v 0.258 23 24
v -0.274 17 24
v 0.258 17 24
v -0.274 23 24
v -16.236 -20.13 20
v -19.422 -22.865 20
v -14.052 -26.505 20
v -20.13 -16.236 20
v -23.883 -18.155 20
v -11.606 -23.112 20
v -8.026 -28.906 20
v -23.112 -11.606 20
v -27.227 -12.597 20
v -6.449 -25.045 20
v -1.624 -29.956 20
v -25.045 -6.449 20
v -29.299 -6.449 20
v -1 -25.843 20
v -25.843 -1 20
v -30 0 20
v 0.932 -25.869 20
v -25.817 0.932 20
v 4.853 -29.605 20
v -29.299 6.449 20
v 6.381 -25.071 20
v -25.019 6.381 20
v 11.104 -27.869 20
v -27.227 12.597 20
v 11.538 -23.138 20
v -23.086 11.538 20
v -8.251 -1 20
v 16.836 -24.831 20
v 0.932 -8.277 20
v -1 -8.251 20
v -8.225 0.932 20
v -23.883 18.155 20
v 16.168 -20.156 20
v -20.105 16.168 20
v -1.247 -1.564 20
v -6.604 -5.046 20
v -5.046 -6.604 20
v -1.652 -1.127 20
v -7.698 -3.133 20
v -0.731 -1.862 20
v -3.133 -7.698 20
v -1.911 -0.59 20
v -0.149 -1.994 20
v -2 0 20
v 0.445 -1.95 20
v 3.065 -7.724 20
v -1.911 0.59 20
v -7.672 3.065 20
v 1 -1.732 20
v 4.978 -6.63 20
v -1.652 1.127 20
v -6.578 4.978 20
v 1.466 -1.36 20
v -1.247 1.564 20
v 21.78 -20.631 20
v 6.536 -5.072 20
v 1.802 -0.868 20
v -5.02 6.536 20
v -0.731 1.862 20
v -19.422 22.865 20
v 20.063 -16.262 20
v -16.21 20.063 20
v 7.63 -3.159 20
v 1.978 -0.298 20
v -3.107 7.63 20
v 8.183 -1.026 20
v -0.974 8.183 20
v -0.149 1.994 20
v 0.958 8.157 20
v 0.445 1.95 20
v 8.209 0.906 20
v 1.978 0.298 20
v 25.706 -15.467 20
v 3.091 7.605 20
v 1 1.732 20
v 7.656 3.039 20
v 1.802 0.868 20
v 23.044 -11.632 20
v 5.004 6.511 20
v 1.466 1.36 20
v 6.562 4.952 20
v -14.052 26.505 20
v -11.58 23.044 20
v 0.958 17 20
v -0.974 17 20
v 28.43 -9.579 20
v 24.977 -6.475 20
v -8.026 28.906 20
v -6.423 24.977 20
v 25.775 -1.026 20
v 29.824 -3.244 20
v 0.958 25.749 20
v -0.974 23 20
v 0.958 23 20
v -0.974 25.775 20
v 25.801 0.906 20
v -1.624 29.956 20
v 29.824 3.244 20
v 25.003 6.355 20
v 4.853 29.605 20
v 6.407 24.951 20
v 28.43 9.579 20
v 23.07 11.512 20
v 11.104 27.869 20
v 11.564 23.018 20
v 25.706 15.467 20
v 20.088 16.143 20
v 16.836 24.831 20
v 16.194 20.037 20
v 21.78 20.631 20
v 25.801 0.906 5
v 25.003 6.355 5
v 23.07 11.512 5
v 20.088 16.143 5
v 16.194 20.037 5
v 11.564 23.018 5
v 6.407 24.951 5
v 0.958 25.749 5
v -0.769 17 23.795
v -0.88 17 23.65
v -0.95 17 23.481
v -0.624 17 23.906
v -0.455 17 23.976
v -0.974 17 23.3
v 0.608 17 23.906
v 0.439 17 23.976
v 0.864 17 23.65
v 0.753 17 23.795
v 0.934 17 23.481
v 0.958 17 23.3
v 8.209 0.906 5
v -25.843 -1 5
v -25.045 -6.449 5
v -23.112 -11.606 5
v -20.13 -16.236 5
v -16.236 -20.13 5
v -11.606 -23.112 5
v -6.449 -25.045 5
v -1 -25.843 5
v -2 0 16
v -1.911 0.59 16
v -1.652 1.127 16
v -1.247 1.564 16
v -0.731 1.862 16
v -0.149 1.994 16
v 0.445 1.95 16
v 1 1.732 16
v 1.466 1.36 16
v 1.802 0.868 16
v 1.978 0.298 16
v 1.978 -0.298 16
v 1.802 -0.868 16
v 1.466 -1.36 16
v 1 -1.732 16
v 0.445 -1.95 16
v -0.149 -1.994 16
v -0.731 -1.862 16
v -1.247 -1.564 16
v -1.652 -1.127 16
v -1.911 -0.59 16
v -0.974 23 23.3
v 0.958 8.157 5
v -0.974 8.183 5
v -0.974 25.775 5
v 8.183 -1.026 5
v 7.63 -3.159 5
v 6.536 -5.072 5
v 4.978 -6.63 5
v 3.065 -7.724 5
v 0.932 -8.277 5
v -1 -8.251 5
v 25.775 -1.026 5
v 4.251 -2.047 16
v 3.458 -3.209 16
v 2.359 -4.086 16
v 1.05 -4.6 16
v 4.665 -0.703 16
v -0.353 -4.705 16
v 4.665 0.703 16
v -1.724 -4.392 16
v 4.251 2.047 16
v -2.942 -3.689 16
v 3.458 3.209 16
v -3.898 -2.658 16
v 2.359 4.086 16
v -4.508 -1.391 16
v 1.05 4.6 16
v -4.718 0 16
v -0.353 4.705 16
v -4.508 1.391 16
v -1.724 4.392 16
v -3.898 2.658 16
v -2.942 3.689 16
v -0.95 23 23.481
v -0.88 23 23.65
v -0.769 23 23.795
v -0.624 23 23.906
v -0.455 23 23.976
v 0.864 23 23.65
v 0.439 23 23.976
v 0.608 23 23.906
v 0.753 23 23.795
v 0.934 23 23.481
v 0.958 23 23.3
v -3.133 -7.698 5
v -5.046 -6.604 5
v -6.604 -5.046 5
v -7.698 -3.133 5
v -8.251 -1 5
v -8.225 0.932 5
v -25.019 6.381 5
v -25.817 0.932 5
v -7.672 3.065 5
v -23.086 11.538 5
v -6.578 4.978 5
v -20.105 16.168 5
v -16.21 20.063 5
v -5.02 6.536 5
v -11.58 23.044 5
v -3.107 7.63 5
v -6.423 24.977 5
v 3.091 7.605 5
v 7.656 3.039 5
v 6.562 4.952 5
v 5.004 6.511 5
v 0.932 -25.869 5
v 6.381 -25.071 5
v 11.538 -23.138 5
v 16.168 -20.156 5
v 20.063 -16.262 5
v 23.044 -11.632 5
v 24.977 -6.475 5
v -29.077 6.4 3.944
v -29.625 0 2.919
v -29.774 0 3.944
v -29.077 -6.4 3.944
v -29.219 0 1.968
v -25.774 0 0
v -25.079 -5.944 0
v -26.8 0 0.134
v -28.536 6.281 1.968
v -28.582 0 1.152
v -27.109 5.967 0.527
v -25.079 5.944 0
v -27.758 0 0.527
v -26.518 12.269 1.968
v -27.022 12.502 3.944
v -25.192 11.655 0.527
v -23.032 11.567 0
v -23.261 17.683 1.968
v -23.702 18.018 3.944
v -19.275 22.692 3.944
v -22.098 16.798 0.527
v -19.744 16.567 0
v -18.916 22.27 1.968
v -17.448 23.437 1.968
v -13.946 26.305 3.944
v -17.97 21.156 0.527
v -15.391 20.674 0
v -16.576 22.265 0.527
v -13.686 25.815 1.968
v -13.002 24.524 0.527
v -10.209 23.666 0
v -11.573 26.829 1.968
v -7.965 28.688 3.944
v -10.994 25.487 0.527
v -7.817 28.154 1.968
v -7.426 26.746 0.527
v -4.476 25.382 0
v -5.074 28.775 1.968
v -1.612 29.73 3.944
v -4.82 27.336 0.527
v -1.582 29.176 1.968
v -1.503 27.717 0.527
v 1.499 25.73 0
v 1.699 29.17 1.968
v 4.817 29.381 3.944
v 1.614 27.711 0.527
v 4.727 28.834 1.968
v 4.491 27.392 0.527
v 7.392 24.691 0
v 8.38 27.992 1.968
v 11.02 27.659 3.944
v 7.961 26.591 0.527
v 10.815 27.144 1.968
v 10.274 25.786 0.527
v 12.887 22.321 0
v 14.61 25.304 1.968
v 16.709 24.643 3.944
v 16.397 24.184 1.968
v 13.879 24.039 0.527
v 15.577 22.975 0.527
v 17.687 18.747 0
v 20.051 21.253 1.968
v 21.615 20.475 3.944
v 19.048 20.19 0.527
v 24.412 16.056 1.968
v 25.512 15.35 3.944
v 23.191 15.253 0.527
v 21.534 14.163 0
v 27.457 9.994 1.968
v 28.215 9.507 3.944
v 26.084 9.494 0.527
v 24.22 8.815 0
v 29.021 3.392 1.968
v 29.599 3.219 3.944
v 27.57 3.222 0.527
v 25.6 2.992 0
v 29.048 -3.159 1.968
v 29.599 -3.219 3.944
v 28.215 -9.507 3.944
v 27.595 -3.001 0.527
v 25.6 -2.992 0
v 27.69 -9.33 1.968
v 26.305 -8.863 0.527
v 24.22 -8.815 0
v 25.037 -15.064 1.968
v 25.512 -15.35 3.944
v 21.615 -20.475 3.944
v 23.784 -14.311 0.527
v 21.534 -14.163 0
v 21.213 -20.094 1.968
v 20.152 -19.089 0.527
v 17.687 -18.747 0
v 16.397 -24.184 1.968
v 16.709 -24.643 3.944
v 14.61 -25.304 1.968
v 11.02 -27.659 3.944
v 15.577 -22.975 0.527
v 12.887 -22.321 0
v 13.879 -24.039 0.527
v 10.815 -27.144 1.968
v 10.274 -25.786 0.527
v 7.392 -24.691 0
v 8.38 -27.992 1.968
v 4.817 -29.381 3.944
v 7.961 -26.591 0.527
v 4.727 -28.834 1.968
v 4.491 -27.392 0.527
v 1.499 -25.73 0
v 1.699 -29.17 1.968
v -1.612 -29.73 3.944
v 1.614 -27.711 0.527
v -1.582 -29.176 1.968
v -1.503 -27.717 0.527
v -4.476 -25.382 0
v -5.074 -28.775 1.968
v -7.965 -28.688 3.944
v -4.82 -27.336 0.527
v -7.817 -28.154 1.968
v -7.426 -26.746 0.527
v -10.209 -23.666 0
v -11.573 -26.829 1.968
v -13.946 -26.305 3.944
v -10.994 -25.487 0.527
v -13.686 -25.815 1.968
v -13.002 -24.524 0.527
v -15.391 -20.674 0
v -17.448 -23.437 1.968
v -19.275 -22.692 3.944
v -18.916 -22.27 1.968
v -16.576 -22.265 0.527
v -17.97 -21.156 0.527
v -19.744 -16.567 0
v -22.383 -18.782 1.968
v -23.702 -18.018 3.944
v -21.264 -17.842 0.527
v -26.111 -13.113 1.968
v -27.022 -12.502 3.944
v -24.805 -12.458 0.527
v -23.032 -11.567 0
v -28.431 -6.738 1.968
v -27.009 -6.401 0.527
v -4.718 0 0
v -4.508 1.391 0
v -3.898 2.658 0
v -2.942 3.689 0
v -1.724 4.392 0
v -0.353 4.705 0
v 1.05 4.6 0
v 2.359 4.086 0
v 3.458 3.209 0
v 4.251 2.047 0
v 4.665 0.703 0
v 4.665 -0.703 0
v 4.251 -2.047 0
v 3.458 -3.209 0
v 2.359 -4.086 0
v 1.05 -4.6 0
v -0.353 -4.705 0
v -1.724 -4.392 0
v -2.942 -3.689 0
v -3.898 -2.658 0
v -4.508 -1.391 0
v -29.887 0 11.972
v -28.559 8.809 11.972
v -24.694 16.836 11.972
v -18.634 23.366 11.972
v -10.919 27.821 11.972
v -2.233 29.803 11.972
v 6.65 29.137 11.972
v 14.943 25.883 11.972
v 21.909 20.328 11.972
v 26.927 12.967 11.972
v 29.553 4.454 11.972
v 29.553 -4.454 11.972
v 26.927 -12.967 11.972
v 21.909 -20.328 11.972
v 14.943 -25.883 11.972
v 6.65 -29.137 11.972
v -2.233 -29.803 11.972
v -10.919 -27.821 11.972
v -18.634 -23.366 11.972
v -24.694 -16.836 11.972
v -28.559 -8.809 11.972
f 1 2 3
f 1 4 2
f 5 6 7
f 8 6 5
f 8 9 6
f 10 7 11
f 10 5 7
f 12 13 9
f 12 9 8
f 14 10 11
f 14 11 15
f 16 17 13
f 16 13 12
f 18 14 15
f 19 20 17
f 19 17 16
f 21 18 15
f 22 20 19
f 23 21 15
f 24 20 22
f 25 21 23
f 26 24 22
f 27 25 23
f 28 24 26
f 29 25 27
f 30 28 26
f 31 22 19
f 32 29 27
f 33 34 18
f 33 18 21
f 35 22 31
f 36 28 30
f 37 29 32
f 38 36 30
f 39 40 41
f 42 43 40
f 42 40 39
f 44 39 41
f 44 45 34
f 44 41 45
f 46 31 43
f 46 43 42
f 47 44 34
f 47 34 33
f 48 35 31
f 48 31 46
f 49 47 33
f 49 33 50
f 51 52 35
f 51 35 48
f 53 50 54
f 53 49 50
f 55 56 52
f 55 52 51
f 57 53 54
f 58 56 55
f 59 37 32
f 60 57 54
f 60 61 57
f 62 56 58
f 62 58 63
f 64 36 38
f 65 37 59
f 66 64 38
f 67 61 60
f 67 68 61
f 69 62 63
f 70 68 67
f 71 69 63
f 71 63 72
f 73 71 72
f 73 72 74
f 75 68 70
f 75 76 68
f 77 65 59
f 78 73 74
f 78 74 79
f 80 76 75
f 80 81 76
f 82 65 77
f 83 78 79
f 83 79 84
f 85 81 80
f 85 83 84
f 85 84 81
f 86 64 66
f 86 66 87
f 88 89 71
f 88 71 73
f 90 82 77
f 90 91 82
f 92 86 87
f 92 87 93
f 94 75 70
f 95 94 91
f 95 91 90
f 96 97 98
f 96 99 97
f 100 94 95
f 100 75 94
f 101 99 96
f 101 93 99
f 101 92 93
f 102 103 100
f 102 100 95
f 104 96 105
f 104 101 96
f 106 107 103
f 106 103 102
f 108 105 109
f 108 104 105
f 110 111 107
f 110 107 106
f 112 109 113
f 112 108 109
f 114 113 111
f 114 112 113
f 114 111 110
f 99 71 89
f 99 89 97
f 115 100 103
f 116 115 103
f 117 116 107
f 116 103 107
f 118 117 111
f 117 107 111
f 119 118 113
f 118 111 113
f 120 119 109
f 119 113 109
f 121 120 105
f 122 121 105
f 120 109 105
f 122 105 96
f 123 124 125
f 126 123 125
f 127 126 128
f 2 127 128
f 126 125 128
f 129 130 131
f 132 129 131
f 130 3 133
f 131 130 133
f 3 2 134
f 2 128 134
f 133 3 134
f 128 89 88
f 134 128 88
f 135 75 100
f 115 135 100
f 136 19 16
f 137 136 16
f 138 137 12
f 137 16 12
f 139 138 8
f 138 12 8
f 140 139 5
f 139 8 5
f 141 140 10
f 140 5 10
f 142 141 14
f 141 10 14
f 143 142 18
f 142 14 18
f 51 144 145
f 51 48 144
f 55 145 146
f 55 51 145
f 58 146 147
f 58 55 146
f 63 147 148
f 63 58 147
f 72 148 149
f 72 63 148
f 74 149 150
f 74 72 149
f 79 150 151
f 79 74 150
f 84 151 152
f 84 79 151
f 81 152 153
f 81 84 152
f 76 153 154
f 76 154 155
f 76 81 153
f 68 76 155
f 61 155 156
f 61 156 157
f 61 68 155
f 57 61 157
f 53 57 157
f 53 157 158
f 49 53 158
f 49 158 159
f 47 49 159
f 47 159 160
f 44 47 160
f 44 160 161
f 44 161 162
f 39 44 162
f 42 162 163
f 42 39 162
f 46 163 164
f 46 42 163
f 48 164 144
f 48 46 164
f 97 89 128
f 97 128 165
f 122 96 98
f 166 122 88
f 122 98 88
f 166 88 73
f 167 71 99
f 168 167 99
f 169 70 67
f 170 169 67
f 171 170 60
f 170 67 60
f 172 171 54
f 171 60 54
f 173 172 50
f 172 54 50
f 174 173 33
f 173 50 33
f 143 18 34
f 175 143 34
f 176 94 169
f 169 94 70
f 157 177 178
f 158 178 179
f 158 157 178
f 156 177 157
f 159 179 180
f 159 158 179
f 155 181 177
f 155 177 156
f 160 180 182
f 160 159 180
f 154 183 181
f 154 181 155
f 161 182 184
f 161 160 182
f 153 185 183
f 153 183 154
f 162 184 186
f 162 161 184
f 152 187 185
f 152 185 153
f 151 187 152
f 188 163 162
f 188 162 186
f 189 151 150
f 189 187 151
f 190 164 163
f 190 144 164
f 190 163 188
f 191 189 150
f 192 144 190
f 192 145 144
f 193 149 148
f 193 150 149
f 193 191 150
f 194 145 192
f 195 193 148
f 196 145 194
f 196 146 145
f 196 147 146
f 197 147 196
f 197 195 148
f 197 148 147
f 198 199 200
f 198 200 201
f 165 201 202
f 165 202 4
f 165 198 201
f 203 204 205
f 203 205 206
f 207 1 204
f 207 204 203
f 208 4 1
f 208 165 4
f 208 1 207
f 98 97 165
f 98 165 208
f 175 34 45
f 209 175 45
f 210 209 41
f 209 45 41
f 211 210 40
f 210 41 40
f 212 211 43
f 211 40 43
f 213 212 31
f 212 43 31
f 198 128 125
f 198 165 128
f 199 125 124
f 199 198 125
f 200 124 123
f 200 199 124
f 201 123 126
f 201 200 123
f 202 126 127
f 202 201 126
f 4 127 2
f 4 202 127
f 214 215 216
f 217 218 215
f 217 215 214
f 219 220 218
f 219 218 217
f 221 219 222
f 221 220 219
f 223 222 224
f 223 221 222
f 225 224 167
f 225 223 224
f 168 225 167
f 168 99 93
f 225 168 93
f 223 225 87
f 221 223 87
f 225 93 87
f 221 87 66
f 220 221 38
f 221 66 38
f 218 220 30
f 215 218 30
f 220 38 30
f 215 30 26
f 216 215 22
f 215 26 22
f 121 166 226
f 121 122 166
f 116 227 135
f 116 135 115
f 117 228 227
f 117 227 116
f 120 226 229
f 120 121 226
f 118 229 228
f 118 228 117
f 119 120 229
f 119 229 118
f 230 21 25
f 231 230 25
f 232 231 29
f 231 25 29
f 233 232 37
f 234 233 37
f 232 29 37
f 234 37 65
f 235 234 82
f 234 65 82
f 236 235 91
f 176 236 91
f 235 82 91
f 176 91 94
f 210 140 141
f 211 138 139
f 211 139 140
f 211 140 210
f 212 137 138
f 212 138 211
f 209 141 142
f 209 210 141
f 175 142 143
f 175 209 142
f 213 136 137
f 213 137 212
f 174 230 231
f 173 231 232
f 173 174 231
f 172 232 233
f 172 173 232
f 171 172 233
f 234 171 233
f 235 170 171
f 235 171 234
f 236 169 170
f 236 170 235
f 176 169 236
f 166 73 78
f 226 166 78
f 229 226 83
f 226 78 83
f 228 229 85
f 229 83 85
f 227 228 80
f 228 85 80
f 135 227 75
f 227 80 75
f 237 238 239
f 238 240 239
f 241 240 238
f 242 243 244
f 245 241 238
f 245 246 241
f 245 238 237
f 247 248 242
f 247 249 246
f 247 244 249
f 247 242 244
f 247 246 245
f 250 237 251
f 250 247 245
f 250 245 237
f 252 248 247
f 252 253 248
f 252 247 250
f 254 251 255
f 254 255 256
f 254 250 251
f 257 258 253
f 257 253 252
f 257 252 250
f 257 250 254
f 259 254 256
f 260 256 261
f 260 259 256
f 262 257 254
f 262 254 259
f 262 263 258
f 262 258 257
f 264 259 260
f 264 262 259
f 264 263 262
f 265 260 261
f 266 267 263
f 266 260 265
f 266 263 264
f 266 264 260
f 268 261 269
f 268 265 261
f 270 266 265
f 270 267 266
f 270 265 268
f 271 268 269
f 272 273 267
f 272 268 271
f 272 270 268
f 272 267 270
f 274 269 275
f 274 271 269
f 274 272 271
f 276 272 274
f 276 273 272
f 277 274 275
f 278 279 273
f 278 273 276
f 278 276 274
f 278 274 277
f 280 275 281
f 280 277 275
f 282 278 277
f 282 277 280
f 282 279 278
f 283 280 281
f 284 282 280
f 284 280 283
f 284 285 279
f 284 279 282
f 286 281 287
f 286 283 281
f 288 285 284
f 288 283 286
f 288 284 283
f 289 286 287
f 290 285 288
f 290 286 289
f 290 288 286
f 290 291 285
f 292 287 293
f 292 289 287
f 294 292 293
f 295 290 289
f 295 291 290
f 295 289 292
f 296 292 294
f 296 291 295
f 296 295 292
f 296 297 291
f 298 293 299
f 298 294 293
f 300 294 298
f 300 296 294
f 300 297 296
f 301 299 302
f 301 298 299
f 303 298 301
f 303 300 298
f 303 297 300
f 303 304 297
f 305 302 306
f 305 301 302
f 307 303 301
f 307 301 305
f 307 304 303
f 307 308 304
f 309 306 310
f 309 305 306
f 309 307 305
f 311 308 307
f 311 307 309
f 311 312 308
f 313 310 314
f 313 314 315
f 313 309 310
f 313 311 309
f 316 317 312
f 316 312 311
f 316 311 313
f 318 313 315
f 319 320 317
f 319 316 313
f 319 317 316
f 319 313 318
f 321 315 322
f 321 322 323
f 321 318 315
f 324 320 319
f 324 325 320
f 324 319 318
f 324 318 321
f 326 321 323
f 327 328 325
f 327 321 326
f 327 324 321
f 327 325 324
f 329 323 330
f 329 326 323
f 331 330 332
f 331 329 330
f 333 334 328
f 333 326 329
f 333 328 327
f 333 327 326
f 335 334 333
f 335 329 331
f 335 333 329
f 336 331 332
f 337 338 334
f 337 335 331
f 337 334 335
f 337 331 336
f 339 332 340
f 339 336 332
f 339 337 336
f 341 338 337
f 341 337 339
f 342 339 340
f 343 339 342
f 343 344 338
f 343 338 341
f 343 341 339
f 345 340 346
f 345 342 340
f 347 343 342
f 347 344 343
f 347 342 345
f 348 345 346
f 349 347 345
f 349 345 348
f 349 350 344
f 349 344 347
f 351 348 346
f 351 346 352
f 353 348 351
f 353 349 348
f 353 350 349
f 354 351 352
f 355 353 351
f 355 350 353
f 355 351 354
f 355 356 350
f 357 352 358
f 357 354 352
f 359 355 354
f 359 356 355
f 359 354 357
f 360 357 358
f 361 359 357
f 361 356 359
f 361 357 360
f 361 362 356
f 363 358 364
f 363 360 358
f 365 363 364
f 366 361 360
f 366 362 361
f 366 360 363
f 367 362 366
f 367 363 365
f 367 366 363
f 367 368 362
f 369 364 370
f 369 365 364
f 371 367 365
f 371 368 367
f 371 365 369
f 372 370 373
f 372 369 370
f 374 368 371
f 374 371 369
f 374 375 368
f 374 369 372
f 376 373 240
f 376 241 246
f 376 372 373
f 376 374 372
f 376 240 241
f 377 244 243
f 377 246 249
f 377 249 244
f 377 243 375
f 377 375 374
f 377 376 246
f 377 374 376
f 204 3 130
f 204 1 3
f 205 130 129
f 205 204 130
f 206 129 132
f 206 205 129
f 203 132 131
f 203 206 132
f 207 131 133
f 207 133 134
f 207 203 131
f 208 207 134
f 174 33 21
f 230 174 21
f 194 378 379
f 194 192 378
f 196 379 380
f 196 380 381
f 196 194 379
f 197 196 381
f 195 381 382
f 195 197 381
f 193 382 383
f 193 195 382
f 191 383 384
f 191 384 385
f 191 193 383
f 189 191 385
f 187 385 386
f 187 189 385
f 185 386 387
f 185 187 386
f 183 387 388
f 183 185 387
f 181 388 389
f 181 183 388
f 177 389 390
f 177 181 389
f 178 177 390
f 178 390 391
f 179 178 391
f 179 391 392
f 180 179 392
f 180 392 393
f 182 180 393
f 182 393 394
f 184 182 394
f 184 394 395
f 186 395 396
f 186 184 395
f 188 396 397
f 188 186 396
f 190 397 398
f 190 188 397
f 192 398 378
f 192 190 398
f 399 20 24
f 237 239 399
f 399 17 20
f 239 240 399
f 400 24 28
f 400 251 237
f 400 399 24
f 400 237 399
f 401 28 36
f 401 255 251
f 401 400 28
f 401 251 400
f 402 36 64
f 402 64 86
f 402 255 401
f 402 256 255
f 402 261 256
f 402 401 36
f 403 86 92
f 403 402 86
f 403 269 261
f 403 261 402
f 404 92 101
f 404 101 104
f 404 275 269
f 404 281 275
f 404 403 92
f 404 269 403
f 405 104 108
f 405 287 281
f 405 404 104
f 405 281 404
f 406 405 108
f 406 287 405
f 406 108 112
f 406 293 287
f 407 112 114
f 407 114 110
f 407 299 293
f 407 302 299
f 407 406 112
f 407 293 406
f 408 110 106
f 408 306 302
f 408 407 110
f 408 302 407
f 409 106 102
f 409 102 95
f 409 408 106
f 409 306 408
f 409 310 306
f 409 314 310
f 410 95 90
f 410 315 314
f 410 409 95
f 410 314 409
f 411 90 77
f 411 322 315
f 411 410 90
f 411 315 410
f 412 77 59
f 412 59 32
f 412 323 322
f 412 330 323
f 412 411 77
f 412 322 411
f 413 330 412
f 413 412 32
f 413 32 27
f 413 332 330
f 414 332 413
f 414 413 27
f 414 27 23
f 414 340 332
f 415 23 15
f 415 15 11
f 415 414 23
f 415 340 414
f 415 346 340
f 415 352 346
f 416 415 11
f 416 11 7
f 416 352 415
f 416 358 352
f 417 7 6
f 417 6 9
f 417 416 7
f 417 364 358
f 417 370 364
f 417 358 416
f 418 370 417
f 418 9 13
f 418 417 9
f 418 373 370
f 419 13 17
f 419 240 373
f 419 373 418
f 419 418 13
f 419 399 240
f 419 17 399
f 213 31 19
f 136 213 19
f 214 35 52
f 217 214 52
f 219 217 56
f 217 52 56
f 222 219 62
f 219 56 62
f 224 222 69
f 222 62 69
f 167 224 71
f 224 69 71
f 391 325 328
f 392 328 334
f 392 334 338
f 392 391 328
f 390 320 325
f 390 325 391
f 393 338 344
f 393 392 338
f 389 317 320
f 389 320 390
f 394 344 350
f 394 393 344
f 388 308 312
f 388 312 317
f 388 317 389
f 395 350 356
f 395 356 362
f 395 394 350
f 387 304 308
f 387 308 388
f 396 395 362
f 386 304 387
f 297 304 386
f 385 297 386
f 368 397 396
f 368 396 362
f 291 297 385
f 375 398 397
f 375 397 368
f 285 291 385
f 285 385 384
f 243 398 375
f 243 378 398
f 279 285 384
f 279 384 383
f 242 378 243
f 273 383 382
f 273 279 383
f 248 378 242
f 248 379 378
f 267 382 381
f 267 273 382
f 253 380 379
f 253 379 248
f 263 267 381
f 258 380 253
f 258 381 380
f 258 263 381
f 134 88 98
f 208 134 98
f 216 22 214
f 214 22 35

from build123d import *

# Parameters (mm, degrees)
F3_DEPTH = 15
F2_W     = 1.932107
F2_H     = 6
F4_DEPTH = 4
F5_R     = 0.7
F6_R     = 0.7


with BuildPart() as f1:
    # F0 (on Front) → F1 (revolve)
    with BuildSketch(Plane.XZ):
        with BuildLine():
            Line((-2, 20), (-30, 20))
            Line((-30, 20), (-29.773503, 3.94358))
            ThreePointArc((-29.773503, 3.94358), (-28.58231, 1.151695), (-25.773901, 0))
            Line((-25.773901, 0), (-4.717873, 0))
            Line((-4.717873, 0), (-4.717873, 16))
            Line((-4.717873, 16), (-2, 16))
            Line((-2, 16), (-2, 20))
        make_face()
    revolve(axis=Axis((0, 0, 6.694083), (0, 0, -1)))

    # F2 (on face) → F3 (cut)
    with BuildSketch(Plane.XY.offset(20)):
        with BuildLine():
            Line((-1, -25.842809), (-1, -8.251002))
            ThreePointArc((-1, -8.251002), (-5.877033, -5.877033), (-8.251002, -1))
            Line((-8.251002, -1), (-25.842809, -1))
            ThreePointArc((-25.842809, -1), (-18.287302, -18.287302), (-1, -25.842809))
        make_face()
        with BuildLine():
            ThreePointArc((8.183109, -1.025774), (5.80914, -5.902807), (0.932107, -8.276776))
            Line((0.932107, -8.276776), (0.932107, -25.868583))
            ThreePointArc((0.932107, -25.868583), (18.219408, -18.313075), (25.774916, -1.025774))
            Line((25.774916, -1.025774), (8.183109, -1.025774))
        make_face()
        with BuildLine():
            ThreePointArc((0.957881, 8.157335), (5.834914, 5.783366), (8.208883, 0.906333))
            Line((8.208883, 0.906333), (25.80069, 0.906333))
            ThreePointArc((25.80069, 0.906333), (18.245182, 18.193635), (0.957881, 25.749142))
            Line((0.957881, 25.749142), (0.957881, 23))
            Line((0.957881, 23), (0.957881, 17))
            Line((0.957881, 17), (0.957881, 8.157335))
        make_face()
        with BuildLine():
            Line((-0.974226, 8.183109), (-0.974226, 17))
            Line((-0.974226, 17), (-0.974226, 23))
            Line((-0.974226, 23), (-0.974226, 25.774916))
            ThreePointArc((-0.974226, 25.774916), (-18.261528, 18.219408), (-25.817035, 0.932107))
            Line((-25.817035, 0.932107), (-8.225228, 0.932107))
            ThreePointArc((-8.225228, 0.932107), (-5.851259, 5.80914), (-0.974226, 8.183109))
        make_face()
    extrude(amount=-F3_DEPTH, mode=Mode.SUBTRACT)

    # F2 (on face) → F4 (join)
    with BuildSketch(Plane.XY.offset(20)):
        with Locations((-0.008172, 20)):
            Rectangle(F2_W, F2_H)
    extrude(amount=F4_DEPTH)

    # F5
    f5_edges = [f1.edges().sort_by_distance(p)[0] for p in [
        (-0.974226, 20, 24),
    ]]
    fillet(f5_edges, radius=F5_R)

    # F6
    f6_edges = [f1.edges().sort_by_distance(p)[0] for p in [
        (0.957881, 20, 24),
    ]]
    fillet(f6_edges, radius=F6_R)


solid = f1.part
